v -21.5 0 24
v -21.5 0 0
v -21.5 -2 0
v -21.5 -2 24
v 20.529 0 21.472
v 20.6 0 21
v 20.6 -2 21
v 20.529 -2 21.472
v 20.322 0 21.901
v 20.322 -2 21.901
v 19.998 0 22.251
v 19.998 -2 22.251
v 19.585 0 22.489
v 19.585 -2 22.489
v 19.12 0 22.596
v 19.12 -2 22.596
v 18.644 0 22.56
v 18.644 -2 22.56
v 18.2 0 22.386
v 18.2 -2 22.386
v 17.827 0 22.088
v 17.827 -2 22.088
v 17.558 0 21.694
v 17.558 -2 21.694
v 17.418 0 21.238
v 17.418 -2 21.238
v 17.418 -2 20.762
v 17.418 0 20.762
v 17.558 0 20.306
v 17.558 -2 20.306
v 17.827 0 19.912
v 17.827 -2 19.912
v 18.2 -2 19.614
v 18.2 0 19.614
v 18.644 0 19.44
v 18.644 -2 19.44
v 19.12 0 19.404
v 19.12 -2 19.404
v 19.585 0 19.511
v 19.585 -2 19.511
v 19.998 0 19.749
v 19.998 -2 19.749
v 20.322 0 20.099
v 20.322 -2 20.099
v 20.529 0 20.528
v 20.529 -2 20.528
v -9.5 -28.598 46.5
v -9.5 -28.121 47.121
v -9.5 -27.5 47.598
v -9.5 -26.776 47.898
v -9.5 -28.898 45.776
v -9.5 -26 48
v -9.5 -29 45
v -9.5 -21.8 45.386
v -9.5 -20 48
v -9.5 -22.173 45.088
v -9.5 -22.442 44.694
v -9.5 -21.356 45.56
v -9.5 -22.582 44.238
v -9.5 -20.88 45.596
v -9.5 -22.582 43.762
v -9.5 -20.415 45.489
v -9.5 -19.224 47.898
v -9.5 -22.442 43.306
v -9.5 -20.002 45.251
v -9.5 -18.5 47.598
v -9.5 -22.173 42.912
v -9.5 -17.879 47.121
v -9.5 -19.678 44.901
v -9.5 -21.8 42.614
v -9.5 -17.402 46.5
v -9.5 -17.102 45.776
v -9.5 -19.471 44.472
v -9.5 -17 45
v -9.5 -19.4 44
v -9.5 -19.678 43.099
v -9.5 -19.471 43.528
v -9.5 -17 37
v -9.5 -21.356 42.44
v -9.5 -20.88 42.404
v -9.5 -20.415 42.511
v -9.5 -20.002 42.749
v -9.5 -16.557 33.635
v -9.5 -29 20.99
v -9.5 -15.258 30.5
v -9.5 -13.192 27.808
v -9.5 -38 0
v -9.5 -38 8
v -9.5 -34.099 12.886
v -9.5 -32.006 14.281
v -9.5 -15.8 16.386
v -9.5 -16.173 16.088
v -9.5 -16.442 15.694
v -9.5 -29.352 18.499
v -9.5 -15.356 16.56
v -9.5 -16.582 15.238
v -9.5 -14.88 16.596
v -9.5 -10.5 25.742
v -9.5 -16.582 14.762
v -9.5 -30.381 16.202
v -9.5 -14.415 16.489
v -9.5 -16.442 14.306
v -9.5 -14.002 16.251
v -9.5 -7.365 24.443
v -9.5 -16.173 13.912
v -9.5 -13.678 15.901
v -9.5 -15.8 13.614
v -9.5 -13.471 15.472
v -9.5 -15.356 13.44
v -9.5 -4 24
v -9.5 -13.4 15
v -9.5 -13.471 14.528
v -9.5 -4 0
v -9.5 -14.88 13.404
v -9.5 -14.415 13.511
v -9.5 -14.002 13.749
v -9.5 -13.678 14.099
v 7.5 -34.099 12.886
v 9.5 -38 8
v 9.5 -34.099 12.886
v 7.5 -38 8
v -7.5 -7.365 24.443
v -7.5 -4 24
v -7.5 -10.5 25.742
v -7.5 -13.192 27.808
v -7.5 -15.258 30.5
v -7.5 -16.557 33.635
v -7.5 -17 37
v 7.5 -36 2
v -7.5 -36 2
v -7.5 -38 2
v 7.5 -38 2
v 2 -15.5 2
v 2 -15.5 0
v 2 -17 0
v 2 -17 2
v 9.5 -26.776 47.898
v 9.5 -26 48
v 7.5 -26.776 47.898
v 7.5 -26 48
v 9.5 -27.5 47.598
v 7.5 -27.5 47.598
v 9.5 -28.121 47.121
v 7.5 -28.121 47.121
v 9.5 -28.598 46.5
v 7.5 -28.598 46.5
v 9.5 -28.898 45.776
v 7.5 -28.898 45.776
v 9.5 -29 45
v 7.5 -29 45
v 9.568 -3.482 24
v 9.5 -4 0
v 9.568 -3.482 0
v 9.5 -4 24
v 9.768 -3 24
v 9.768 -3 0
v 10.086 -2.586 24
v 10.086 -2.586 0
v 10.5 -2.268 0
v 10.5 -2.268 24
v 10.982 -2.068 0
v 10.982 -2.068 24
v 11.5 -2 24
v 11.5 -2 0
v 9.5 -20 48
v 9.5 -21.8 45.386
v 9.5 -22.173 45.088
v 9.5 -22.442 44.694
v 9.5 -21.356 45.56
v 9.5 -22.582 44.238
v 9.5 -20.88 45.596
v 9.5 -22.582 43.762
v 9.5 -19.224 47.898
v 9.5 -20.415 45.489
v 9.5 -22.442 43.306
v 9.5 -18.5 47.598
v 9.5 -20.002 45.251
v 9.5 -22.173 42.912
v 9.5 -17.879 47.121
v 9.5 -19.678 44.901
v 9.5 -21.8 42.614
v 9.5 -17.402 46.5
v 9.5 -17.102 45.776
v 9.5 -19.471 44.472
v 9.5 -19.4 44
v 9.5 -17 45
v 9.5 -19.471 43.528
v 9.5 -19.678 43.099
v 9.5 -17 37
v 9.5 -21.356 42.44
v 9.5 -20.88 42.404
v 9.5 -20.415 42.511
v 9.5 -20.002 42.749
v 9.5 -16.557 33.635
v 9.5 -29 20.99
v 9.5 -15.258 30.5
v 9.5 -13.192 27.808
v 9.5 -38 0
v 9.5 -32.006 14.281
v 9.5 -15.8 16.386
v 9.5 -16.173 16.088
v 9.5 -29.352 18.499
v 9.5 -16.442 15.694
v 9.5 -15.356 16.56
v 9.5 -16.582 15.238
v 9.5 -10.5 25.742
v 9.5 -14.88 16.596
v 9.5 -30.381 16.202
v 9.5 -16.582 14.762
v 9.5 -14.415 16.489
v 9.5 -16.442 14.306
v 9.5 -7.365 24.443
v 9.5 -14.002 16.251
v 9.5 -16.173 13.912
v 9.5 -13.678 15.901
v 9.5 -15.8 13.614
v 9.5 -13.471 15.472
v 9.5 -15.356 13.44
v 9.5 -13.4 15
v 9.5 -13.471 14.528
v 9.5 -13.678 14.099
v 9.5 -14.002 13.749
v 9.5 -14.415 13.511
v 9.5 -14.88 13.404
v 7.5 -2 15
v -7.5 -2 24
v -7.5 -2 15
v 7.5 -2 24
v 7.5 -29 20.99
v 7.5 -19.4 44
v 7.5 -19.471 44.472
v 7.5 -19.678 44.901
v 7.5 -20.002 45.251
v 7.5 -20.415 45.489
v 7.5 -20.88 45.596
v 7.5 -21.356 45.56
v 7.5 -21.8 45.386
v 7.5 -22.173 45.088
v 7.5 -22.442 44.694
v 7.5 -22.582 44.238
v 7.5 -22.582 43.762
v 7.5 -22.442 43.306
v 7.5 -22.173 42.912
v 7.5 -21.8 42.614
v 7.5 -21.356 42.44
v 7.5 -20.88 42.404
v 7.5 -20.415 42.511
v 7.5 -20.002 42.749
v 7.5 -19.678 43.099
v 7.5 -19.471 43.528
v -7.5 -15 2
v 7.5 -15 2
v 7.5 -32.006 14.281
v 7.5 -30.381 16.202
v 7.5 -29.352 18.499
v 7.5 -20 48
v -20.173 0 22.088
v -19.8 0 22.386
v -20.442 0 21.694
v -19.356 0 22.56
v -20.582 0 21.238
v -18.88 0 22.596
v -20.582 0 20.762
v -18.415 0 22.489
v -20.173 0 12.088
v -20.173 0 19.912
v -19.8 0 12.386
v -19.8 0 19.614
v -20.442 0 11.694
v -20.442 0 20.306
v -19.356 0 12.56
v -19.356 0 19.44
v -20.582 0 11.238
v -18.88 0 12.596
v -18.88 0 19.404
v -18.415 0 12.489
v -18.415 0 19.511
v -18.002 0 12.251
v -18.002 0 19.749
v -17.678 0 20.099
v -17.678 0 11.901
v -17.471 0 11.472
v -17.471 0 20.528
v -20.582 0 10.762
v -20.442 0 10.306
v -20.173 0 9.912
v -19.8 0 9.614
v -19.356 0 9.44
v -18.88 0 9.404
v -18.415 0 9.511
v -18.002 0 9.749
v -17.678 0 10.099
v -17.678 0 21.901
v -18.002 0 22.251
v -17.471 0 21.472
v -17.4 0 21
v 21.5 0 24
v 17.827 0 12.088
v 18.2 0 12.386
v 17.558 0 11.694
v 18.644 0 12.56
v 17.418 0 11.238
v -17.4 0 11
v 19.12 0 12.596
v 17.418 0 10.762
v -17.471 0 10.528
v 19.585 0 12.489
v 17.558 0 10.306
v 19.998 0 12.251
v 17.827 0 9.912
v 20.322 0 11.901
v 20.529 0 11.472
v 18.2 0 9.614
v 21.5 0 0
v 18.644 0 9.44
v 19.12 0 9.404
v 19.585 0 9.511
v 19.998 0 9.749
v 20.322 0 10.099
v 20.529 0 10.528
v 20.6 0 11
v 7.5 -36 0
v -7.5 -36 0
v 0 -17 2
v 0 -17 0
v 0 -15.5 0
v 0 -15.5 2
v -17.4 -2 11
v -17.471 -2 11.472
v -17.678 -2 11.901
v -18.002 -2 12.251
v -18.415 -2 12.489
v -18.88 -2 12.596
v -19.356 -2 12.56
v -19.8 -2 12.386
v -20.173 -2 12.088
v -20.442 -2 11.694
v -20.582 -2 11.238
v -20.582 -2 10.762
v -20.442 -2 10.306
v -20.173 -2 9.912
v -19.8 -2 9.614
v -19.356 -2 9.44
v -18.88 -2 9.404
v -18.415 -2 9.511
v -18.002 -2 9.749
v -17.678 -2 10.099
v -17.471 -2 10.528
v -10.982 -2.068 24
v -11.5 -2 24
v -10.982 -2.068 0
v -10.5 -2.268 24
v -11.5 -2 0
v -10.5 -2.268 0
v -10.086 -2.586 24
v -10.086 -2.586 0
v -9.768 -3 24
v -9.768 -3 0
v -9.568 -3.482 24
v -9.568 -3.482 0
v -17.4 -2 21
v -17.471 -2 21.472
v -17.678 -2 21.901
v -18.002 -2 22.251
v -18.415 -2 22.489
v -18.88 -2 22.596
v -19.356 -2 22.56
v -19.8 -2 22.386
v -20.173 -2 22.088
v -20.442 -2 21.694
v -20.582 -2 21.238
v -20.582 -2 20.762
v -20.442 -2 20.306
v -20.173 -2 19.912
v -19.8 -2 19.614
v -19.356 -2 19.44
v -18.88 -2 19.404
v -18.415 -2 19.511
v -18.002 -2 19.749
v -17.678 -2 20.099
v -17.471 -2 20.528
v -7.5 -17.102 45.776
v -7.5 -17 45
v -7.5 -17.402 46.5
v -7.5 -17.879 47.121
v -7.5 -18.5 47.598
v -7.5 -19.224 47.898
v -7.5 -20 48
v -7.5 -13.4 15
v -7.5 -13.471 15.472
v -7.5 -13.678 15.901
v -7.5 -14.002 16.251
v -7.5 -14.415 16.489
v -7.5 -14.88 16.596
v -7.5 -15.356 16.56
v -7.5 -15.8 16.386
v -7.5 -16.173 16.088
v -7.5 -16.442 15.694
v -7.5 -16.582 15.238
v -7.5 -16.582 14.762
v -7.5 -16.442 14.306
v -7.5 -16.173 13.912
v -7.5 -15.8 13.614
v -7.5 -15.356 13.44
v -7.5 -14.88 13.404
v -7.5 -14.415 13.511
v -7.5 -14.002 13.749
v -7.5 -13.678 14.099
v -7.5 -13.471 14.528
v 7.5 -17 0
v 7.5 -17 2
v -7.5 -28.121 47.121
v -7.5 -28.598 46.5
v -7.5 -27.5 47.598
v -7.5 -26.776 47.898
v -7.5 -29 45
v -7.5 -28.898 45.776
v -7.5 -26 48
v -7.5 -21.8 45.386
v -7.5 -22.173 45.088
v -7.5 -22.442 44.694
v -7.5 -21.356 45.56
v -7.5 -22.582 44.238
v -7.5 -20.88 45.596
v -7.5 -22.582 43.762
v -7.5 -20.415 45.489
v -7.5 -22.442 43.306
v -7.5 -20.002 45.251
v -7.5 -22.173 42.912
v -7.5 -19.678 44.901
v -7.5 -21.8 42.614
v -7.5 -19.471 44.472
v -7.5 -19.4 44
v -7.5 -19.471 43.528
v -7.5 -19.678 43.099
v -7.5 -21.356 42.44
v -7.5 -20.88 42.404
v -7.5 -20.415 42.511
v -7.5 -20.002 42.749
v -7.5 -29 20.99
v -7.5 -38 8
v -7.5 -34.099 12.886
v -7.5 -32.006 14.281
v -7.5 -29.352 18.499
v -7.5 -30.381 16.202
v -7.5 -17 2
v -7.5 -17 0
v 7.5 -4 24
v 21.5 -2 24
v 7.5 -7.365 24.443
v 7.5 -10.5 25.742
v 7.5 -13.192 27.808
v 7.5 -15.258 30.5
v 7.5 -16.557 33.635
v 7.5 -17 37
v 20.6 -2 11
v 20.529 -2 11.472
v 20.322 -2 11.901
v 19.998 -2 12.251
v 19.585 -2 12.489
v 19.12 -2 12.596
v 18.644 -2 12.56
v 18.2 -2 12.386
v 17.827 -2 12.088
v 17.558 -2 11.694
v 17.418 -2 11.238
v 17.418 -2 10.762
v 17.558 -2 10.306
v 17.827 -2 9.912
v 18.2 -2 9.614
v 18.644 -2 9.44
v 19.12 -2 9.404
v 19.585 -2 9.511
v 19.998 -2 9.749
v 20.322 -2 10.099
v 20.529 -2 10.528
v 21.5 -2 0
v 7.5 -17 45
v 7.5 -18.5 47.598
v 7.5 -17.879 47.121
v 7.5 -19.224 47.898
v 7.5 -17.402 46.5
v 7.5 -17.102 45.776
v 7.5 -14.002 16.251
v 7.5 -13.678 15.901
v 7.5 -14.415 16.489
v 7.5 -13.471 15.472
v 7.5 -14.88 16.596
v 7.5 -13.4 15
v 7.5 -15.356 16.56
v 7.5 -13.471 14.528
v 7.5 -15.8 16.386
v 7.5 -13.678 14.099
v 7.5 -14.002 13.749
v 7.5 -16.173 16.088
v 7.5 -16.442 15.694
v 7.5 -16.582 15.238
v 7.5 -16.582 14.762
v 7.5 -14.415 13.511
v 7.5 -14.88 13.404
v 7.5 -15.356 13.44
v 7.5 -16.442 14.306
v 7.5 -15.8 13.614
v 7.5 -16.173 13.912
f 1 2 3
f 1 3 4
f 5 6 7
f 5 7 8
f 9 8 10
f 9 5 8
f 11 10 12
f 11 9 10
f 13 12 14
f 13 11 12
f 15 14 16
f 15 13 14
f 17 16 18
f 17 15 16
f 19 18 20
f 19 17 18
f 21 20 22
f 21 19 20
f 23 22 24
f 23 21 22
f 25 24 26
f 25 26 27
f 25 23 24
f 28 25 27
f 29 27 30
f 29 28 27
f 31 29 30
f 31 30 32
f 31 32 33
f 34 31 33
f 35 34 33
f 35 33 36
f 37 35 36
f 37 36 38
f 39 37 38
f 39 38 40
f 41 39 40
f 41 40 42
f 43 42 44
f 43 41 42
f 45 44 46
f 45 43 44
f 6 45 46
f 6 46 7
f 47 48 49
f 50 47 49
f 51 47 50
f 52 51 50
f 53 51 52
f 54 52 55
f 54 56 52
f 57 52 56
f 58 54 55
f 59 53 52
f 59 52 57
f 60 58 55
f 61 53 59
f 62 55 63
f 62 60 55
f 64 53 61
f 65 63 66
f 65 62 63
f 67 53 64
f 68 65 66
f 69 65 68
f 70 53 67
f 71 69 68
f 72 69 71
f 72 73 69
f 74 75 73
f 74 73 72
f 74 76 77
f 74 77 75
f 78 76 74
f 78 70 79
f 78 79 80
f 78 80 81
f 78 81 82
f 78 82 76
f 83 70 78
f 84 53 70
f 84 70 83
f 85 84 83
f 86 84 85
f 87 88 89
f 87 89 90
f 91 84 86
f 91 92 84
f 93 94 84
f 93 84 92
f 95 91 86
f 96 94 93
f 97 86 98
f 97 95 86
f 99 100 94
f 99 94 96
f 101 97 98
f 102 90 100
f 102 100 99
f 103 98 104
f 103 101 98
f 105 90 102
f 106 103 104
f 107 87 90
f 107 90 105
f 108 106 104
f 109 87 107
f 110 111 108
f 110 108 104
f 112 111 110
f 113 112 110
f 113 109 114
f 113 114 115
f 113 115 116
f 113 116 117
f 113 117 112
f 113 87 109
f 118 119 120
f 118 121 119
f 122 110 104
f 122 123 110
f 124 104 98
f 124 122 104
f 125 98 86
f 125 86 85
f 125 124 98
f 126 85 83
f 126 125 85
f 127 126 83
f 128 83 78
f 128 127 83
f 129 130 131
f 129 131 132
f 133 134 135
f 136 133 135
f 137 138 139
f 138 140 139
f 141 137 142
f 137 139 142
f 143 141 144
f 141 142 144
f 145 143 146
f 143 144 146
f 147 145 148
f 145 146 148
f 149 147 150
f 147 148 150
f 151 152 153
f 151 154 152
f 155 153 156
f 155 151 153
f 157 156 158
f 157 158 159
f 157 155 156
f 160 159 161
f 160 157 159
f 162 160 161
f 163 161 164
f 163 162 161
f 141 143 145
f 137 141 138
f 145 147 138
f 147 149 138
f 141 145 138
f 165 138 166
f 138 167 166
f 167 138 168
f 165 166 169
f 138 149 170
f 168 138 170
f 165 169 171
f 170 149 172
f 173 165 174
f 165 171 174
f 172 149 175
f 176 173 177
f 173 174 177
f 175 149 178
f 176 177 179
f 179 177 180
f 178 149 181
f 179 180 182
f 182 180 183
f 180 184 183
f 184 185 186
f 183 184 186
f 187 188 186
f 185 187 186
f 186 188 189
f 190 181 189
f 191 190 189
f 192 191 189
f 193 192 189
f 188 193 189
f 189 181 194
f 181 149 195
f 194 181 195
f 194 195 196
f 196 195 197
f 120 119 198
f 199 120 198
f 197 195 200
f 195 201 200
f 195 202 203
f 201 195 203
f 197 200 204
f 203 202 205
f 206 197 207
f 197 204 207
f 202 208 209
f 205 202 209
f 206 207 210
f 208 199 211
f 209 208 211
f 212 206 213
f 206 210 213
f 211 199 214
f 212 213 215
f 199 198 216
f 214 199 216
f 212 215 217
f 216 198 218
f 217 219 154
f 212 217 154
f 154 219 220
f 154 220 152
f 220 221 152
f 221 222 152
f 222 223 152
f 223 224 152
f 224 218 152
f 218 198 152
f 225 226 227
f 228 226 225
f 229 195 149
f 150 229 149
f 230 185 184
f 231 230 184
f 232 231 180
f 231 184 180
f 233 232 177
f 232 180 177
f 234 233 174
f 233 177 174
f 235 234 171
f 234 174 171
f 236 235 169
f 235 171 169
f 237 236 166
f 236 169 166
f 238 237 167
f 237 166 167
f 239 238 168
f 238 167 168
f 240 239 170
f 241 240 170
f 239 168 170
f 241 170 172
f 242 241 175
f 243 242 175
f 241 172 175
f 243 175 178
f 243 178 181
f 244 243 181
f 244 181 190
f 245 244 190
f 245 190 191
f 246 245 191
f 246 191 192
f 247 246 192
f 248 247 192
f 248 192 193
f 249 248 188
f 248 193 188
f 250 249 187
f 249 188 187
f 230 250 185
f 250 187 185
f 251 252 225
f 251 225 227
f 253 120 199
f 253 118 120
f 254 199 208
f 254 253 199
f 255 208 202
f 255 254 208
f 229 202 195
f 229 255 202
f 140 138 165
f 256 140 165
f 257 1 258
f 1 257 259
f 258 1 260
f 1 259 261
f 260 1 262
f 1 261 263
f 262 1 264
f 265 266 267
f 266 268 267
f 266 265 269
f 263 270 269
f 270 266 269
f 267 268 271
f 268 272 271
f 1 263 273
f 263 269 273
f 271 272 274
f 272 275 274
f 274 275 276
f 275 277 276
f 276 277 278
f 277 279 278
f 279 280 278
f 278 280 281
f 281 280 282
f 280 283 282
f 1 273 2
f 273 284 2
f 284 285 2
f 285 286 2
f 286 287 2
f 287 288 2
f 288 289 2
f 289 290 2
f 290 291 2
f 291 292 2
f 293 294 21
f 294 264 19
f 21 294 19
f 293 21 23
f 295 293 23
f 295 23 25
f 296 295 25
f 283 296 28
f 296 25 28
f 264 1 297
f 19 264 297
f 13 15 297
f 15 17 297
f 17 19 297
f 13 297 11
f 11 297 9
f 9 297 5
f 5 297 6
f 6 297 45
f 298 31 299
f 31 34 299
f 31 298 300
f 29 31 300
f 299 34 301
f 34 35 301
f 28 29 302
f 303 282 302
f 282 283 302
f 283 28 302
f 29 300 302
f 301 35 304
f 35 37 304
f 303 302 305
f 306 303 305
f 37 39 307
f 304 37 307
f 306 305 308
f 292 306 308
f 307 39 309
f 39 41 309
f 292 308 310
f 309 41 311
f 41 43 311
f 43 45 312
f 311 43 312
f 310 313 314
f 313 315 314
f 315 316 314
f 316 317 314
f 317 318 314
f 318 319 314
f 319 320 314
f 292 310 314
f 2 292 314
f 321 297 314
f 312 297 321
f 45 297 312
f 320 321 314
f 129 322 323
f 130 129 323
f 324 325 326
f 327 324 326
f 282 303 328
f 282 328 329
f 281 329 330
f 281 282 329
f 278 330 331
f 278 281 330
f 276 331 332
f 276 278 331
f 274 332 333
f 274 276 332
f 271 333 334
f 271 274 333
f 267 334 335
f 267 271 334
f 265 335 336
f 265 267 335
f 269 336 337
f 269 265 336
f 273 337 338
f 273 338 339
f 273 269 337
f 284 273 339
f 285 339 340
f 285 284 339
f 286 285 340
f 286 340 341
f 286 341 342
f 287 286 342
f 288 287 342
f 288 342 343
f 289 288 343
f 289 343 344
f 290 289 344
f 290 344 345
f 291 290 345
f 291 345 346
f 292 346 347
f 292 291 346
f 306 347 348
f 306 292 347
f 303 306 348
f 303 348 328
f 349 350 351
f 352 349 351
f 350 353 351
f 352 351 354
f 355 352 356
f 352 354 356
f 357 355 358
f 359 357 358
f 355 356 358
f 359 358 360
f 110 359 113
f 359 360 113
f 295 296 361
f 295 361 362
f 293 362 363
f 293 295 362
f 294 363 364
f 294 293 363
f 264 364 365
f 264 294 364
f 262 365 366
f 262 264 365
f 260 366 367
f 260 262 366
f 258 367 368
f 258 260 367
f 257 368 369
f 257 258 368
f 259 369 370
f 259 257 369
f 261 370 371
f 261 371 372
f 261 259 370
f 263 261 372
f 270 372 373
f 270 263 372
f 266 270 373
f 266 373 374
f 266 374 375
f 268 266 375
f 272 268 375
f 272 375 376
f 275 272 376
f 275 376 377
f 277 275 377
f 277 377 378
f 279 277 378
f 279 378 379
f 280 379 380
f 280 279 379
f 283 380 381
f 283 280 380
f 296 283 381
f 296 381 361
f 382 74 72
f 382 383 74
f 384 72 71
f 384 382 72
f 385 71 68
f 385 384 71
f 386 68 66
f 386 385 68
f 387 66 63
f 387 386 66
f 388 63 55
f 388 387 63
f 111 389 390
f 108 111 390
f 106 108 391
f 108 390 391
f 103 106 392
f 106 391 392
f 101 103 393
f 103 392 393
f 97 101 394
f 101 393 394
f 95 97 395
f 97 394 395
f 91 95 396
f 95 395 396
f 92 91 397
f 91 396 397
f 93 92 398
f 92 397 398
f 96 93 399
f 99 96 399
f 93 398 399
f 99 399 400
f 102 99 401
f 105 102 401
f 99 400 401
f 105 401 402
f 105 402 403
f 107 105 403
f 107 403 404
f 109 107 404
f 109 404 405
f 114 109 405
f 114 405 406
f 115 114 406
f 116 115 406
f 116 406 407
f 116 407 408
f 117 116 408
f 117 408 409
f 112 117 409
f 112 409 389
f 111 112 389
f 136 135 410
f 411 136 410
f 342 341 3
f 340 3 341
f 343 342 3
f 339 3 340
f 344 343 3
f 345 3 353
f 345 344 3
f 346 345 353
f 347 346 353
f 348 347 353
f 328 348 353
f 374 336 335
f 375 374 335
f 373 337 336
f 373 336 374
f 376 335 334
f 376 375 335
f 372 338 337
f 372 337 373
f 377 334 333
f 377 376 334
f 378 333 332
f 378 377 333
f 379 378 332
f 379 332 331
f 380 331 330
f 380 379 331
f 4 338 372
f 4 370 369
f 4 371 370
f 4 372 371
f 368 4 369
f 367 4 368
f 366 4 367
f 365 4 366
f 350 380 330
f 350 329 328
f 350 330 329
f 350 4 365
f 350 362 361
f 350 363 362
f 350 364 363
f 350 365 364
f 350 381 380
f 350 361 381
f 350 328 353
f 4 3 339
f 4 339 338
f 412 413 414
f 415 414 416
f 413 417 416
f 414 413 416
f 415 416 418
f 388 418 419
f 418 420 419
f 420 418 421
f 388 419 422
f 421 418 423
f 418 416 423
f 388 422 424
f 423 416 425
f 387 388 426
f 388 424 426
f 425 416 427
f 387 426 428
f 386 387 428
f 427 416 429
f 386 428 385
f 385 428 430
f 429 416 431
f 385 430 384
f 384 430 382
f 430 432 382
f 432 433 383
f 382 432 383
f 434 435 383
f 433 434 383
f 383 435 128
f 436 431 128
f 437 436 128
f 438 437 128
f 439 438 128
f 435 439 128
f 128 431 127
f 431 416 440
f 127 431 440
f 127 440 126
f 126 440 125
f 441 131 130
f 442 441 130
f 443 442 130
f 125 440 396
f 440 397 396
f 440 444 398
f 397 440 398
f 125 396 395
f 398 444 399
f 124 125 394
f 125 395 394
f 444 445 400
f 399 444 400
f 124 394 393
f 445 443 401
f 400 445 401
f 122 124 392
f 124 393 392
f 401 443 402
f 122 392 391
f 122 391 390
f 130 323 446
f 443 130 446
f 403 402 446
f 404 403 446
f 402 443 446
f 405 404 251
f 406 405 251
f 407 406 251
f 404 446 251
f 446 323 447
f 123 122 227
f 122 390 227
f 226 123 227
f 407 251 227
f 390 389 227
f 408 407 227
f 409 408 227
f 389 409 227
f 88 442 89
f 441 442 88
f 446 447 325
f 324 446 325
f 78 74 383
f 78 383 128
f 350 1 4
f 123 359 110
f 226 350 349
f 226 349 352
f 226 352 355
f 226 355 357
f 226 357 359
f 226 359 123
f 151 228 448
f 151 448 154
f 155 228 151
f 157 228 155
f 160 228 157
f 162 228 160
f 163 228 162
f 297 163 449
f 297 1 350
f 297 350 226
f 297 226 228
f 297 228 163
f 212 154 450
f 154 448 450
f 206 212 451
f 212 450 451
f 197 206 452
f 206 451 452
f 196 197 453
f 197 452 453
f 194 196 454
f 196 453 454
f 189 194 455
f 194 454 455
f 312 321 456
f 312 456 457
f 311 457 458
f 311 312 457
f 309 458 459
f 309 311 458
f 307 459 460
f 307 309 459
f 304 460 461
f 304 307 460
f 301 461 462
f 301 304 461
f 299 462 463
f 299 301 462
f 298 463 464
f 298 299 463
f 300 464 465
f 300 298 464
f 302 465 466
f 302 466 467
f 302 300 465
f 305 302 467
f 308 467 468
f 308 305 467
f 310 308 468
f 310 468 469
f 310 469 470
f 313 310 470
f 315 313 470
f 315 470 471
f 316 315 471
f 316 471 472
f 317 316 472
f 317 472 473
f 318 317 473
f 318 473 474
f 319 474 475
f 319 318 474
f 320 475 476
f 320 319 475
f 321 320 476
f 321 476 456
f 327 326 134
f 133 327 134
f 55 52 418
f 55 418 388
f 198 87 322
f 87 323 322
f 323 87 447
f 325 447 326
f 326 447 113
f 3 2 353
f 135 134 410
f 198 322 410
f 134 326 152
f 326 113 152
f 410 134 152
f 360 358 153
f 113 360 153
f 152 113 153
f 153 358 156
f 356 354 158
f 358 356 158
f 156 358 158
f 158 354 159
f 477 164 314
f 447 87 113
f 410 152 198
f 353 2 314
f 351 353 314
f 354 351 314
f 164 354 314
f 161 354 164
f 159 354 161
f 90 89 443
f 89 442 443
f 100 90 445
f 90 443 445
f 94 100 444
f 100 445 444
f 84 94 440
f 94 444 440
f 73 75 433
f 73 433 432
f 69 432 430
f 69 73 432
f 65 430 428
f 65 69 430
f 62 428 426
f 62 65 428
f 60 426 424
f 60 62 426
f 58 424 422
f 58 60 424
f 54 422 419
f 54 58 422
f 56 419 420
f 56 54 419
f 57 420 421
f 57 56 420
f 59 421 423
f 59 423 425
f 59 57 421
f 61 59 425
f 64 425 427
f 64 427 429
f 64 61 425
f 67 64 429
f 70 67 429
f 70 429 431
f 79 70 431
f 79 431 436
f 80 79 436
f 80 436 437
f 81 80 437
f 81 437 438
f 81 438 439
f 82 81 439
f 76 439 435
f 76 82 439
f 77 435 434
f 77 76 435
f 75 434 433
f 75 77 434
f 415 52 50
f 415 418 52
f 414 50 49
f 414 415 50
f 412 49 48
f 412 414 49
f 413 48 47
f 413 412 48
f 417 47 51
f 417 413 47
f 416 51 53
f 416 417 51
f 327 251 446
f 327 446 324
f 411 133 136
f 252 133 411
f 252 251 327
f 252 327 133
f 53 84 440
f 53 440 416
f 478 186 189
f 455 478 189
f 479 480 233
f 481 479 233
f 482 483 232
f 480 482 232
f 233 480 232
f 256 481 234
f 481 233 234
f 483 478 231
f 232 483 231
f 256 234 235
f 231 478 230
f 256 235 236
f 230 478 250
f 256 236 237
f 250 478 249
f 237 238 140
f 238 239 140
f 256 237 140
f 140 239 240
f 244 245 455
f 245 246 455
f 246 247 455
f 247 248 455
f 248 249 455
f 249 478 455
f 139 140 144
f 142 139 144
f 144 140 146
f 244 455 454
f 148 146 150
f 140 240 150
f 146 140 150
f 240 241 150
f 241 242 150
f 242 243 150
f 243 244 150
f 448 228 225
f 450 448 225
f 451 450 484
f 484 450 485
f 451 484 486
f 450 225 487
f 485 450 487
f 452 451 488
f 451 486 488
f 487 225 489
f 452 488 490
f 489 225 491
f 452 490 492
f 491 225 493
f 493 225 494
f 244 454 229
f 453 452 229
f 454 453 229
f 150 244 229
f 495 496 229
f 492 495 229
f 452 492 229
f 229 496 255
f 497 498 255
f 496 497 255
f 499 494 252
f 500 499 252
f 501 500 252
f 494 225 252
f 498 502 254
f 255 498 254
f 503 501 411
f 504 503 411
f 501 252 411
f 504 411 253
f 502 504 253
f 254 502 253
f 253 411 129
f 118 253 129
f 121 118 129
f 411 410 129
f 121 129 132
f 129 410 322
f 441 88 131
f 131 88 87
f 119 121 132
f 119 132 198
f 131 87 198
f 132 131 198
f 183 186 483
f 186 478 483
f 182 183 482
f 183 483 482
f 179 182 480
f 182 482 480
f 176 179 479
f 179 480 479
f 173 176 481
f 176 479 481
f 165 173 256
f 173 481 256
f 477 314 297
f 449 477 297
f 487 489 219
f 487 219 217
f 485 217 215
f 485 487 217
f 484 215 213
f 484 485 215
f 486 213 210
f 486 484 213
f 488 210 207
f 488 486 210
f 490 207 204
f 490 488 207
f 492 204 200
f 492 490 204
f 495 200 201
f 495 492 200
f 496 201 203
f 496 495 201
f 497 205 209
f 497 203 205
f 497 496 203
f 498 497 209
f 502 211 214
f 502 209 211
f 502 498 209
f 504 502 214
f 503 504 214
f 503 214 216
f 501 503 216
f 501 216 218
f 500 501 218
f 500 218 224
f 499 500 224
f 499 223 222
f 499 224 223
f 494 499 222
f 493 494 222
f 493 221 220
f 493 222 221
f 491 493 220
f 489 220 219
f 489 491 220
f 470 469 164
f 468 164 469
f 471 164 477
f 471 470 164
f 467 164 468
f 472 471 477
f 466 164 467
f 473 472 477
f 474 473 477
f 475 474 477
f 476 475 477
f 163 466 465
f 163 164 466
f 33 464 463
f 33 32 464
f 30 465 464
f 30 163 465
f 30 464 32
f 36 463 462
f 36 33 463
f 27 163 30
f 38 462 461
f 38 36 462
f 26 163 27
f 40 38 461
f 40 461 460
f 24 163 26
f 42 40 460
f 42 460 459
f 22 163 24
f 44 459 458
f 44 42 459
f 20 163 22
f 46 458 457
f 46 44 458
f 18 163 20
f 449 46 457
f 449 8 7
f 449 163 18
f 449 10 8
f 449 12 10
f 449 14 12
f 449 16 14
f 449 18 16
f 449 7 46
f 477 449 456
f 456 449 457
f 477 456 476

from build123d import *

# Parameters (mm, degrees)
SKETCH_W          = 43
SKETCH_H          = 24
SKETCH_R          = 1.6
PAD_DEPTH         = 2
SKETCH001_W       = 19
SKETCH001_H       = 38
PAD001_DEPTH      = 2
SKETCH002_R       = 1.6
PAD002_DEPTH      = 2
SKETCH005_R       = 1.6
PAD003_DEPTH      = 2
SKETCH004_R       = 1.6
POCKET_DEPTH      = 21.501
POCKET_DEPTH_BACK = -21.501
FILLET_R          = 2
FILLET001_R       = 8.99
CHAMFER_SIZE      = 4
CHAMFER001_SIZE   = 13
FILLET002_R       = 13
FILLET003_R       = 3


with BuildPart() as part:
    # Sketch → Pad (new body)
    with BuildSketch(Plane.XZ):
        with Locations((0, 12)):
            Rectangle(SKETCH_W, SKETCH_H)
        with Locations((-19, 21)):
            Circle(SKETCH_R, mode=Mode.SUBTRACT)
        with Locations((-19, 11)):
            Circle(SKETCH_R, mode=Mode.SUBTRACT)
        with Locations((19, 11)):
            Circle(SKETCH_R, mode=Mode.SUBTRACT)
        with Locations((19, 21)):
            Circle(SKETCH_R, mode=Mode.SUBTRACT)
    extrude(amount=PAD_DEPTH)

    # Sketch001 → Pad001 (join)
    with BuildSketch(Plane.XY):
        with Locations((0, -19)):
            Rectangle(SKETCH001_W, SKETCH001_H)
        Polygon((7.5, -17), (7.5, -36), (-7.5, -36), (-7.5, -17), (0, -17), (0, -15.5), (2, -15.5), (2, -17), align=None, mode=Mode.SUBTRACT)
    extrude(amount=PAD001_DEPTH)

    # Sketch002 (on DatumPlane) → Pad002 (join)
    with BuildSketch(Plane.YZ.offset(-9.5)):
        Polygon((0, 24), (0, 0), (-38, 0), (-38, 12), (-29, 12), (-29, 48), (-17, 48), (-17, 24), align=None)
        with Locations((-21, 44)):
            Circle(SKETCH002_R, mode=Mode.SUBTRACT)
    extrude(amount=PAD002_DEPTH)

    # Sketch005 (on DatumPlane) → Pad003 (join)
    with BuildSketch(Plane.YZ.offset(9.5)):
        Polygon((0, 24), (0, 0), (-38, 0), (-38, 12), (-29, 12), (-29, 48), (-17, 48), (-17, 24), align=None)
        with Locations((-21, 44)):
            Circle(SKETCH005_R, mode=Mode.SUBTRACT)
    extrude(amount=-PAD003_DEPTH)

    # Sketch004 → Pocket (cut, two sides)
    with BuildSketch(Plane.YZ) as pocket_sk:
        with Locations((-15, 15)):
            Circle(SKETCH004_R)
    extrude(amount=-POCKET_DEPTH, mode=Mode.SUBTRACT)
    extrude(pocket_sk.sketch, amount=-POCKET_DEPTH_BACK, mode=Mode.SUBTRACT)

    # Fillet
    fillet_edges = [part.edges().sort_by_distance(p)[0] for p in [
        (9.5, -2, 13),
        (-9.5, -2, 13),
    ]]
    fillet(fillet_edges, radius=FILLET_R)

    # Fillet001
    fillet001_edges = [part.edges().sort_by_distance(p)[0] for p in [
        (8.5, -29, 12),
        (-8.5, -29, 12),
    ]]
    fillet(fillet001_edges, radius=FILLET001_R)

    # Chamfer
    chamfer_edges = [part.edges().sort_by_distance(p)[0] for p in [
        (8.5, -38, 12),
        (-8.5, -38, 12),
    ]]
    chamfer(chamfer_edges, length=CHAMFER_SIZE)

    # Chamfer001
    chamfer001_edges = [part.edges().sort_by_distance(p)[0] for p in [
        (0, -2, 2),
    ]]
    chamfer(chamfer001_edges, length=CHAMFER001_SIZE)

    # Fillet002
    fillet002_edges = [part.edges().sort_by_distance(p)[0] for p in [
        (8.5, -17, 24),
        (-8.5, -17, 24),
    ]]
    fillet(fillet002_edges, radius=FILLET002_R)

    # Fillet003
    fillet003_edges = [part.edges().sort_by_distance(p)[0] for p in [
        (8.5, -29, 48),
        (-8.5, -29, 48),
        (-8.5, -17, 48),
        (8.5, -17, 48),
    ]]
    fillet(fillet003_edges, radius=FILLET003_R)


solid = part.part
